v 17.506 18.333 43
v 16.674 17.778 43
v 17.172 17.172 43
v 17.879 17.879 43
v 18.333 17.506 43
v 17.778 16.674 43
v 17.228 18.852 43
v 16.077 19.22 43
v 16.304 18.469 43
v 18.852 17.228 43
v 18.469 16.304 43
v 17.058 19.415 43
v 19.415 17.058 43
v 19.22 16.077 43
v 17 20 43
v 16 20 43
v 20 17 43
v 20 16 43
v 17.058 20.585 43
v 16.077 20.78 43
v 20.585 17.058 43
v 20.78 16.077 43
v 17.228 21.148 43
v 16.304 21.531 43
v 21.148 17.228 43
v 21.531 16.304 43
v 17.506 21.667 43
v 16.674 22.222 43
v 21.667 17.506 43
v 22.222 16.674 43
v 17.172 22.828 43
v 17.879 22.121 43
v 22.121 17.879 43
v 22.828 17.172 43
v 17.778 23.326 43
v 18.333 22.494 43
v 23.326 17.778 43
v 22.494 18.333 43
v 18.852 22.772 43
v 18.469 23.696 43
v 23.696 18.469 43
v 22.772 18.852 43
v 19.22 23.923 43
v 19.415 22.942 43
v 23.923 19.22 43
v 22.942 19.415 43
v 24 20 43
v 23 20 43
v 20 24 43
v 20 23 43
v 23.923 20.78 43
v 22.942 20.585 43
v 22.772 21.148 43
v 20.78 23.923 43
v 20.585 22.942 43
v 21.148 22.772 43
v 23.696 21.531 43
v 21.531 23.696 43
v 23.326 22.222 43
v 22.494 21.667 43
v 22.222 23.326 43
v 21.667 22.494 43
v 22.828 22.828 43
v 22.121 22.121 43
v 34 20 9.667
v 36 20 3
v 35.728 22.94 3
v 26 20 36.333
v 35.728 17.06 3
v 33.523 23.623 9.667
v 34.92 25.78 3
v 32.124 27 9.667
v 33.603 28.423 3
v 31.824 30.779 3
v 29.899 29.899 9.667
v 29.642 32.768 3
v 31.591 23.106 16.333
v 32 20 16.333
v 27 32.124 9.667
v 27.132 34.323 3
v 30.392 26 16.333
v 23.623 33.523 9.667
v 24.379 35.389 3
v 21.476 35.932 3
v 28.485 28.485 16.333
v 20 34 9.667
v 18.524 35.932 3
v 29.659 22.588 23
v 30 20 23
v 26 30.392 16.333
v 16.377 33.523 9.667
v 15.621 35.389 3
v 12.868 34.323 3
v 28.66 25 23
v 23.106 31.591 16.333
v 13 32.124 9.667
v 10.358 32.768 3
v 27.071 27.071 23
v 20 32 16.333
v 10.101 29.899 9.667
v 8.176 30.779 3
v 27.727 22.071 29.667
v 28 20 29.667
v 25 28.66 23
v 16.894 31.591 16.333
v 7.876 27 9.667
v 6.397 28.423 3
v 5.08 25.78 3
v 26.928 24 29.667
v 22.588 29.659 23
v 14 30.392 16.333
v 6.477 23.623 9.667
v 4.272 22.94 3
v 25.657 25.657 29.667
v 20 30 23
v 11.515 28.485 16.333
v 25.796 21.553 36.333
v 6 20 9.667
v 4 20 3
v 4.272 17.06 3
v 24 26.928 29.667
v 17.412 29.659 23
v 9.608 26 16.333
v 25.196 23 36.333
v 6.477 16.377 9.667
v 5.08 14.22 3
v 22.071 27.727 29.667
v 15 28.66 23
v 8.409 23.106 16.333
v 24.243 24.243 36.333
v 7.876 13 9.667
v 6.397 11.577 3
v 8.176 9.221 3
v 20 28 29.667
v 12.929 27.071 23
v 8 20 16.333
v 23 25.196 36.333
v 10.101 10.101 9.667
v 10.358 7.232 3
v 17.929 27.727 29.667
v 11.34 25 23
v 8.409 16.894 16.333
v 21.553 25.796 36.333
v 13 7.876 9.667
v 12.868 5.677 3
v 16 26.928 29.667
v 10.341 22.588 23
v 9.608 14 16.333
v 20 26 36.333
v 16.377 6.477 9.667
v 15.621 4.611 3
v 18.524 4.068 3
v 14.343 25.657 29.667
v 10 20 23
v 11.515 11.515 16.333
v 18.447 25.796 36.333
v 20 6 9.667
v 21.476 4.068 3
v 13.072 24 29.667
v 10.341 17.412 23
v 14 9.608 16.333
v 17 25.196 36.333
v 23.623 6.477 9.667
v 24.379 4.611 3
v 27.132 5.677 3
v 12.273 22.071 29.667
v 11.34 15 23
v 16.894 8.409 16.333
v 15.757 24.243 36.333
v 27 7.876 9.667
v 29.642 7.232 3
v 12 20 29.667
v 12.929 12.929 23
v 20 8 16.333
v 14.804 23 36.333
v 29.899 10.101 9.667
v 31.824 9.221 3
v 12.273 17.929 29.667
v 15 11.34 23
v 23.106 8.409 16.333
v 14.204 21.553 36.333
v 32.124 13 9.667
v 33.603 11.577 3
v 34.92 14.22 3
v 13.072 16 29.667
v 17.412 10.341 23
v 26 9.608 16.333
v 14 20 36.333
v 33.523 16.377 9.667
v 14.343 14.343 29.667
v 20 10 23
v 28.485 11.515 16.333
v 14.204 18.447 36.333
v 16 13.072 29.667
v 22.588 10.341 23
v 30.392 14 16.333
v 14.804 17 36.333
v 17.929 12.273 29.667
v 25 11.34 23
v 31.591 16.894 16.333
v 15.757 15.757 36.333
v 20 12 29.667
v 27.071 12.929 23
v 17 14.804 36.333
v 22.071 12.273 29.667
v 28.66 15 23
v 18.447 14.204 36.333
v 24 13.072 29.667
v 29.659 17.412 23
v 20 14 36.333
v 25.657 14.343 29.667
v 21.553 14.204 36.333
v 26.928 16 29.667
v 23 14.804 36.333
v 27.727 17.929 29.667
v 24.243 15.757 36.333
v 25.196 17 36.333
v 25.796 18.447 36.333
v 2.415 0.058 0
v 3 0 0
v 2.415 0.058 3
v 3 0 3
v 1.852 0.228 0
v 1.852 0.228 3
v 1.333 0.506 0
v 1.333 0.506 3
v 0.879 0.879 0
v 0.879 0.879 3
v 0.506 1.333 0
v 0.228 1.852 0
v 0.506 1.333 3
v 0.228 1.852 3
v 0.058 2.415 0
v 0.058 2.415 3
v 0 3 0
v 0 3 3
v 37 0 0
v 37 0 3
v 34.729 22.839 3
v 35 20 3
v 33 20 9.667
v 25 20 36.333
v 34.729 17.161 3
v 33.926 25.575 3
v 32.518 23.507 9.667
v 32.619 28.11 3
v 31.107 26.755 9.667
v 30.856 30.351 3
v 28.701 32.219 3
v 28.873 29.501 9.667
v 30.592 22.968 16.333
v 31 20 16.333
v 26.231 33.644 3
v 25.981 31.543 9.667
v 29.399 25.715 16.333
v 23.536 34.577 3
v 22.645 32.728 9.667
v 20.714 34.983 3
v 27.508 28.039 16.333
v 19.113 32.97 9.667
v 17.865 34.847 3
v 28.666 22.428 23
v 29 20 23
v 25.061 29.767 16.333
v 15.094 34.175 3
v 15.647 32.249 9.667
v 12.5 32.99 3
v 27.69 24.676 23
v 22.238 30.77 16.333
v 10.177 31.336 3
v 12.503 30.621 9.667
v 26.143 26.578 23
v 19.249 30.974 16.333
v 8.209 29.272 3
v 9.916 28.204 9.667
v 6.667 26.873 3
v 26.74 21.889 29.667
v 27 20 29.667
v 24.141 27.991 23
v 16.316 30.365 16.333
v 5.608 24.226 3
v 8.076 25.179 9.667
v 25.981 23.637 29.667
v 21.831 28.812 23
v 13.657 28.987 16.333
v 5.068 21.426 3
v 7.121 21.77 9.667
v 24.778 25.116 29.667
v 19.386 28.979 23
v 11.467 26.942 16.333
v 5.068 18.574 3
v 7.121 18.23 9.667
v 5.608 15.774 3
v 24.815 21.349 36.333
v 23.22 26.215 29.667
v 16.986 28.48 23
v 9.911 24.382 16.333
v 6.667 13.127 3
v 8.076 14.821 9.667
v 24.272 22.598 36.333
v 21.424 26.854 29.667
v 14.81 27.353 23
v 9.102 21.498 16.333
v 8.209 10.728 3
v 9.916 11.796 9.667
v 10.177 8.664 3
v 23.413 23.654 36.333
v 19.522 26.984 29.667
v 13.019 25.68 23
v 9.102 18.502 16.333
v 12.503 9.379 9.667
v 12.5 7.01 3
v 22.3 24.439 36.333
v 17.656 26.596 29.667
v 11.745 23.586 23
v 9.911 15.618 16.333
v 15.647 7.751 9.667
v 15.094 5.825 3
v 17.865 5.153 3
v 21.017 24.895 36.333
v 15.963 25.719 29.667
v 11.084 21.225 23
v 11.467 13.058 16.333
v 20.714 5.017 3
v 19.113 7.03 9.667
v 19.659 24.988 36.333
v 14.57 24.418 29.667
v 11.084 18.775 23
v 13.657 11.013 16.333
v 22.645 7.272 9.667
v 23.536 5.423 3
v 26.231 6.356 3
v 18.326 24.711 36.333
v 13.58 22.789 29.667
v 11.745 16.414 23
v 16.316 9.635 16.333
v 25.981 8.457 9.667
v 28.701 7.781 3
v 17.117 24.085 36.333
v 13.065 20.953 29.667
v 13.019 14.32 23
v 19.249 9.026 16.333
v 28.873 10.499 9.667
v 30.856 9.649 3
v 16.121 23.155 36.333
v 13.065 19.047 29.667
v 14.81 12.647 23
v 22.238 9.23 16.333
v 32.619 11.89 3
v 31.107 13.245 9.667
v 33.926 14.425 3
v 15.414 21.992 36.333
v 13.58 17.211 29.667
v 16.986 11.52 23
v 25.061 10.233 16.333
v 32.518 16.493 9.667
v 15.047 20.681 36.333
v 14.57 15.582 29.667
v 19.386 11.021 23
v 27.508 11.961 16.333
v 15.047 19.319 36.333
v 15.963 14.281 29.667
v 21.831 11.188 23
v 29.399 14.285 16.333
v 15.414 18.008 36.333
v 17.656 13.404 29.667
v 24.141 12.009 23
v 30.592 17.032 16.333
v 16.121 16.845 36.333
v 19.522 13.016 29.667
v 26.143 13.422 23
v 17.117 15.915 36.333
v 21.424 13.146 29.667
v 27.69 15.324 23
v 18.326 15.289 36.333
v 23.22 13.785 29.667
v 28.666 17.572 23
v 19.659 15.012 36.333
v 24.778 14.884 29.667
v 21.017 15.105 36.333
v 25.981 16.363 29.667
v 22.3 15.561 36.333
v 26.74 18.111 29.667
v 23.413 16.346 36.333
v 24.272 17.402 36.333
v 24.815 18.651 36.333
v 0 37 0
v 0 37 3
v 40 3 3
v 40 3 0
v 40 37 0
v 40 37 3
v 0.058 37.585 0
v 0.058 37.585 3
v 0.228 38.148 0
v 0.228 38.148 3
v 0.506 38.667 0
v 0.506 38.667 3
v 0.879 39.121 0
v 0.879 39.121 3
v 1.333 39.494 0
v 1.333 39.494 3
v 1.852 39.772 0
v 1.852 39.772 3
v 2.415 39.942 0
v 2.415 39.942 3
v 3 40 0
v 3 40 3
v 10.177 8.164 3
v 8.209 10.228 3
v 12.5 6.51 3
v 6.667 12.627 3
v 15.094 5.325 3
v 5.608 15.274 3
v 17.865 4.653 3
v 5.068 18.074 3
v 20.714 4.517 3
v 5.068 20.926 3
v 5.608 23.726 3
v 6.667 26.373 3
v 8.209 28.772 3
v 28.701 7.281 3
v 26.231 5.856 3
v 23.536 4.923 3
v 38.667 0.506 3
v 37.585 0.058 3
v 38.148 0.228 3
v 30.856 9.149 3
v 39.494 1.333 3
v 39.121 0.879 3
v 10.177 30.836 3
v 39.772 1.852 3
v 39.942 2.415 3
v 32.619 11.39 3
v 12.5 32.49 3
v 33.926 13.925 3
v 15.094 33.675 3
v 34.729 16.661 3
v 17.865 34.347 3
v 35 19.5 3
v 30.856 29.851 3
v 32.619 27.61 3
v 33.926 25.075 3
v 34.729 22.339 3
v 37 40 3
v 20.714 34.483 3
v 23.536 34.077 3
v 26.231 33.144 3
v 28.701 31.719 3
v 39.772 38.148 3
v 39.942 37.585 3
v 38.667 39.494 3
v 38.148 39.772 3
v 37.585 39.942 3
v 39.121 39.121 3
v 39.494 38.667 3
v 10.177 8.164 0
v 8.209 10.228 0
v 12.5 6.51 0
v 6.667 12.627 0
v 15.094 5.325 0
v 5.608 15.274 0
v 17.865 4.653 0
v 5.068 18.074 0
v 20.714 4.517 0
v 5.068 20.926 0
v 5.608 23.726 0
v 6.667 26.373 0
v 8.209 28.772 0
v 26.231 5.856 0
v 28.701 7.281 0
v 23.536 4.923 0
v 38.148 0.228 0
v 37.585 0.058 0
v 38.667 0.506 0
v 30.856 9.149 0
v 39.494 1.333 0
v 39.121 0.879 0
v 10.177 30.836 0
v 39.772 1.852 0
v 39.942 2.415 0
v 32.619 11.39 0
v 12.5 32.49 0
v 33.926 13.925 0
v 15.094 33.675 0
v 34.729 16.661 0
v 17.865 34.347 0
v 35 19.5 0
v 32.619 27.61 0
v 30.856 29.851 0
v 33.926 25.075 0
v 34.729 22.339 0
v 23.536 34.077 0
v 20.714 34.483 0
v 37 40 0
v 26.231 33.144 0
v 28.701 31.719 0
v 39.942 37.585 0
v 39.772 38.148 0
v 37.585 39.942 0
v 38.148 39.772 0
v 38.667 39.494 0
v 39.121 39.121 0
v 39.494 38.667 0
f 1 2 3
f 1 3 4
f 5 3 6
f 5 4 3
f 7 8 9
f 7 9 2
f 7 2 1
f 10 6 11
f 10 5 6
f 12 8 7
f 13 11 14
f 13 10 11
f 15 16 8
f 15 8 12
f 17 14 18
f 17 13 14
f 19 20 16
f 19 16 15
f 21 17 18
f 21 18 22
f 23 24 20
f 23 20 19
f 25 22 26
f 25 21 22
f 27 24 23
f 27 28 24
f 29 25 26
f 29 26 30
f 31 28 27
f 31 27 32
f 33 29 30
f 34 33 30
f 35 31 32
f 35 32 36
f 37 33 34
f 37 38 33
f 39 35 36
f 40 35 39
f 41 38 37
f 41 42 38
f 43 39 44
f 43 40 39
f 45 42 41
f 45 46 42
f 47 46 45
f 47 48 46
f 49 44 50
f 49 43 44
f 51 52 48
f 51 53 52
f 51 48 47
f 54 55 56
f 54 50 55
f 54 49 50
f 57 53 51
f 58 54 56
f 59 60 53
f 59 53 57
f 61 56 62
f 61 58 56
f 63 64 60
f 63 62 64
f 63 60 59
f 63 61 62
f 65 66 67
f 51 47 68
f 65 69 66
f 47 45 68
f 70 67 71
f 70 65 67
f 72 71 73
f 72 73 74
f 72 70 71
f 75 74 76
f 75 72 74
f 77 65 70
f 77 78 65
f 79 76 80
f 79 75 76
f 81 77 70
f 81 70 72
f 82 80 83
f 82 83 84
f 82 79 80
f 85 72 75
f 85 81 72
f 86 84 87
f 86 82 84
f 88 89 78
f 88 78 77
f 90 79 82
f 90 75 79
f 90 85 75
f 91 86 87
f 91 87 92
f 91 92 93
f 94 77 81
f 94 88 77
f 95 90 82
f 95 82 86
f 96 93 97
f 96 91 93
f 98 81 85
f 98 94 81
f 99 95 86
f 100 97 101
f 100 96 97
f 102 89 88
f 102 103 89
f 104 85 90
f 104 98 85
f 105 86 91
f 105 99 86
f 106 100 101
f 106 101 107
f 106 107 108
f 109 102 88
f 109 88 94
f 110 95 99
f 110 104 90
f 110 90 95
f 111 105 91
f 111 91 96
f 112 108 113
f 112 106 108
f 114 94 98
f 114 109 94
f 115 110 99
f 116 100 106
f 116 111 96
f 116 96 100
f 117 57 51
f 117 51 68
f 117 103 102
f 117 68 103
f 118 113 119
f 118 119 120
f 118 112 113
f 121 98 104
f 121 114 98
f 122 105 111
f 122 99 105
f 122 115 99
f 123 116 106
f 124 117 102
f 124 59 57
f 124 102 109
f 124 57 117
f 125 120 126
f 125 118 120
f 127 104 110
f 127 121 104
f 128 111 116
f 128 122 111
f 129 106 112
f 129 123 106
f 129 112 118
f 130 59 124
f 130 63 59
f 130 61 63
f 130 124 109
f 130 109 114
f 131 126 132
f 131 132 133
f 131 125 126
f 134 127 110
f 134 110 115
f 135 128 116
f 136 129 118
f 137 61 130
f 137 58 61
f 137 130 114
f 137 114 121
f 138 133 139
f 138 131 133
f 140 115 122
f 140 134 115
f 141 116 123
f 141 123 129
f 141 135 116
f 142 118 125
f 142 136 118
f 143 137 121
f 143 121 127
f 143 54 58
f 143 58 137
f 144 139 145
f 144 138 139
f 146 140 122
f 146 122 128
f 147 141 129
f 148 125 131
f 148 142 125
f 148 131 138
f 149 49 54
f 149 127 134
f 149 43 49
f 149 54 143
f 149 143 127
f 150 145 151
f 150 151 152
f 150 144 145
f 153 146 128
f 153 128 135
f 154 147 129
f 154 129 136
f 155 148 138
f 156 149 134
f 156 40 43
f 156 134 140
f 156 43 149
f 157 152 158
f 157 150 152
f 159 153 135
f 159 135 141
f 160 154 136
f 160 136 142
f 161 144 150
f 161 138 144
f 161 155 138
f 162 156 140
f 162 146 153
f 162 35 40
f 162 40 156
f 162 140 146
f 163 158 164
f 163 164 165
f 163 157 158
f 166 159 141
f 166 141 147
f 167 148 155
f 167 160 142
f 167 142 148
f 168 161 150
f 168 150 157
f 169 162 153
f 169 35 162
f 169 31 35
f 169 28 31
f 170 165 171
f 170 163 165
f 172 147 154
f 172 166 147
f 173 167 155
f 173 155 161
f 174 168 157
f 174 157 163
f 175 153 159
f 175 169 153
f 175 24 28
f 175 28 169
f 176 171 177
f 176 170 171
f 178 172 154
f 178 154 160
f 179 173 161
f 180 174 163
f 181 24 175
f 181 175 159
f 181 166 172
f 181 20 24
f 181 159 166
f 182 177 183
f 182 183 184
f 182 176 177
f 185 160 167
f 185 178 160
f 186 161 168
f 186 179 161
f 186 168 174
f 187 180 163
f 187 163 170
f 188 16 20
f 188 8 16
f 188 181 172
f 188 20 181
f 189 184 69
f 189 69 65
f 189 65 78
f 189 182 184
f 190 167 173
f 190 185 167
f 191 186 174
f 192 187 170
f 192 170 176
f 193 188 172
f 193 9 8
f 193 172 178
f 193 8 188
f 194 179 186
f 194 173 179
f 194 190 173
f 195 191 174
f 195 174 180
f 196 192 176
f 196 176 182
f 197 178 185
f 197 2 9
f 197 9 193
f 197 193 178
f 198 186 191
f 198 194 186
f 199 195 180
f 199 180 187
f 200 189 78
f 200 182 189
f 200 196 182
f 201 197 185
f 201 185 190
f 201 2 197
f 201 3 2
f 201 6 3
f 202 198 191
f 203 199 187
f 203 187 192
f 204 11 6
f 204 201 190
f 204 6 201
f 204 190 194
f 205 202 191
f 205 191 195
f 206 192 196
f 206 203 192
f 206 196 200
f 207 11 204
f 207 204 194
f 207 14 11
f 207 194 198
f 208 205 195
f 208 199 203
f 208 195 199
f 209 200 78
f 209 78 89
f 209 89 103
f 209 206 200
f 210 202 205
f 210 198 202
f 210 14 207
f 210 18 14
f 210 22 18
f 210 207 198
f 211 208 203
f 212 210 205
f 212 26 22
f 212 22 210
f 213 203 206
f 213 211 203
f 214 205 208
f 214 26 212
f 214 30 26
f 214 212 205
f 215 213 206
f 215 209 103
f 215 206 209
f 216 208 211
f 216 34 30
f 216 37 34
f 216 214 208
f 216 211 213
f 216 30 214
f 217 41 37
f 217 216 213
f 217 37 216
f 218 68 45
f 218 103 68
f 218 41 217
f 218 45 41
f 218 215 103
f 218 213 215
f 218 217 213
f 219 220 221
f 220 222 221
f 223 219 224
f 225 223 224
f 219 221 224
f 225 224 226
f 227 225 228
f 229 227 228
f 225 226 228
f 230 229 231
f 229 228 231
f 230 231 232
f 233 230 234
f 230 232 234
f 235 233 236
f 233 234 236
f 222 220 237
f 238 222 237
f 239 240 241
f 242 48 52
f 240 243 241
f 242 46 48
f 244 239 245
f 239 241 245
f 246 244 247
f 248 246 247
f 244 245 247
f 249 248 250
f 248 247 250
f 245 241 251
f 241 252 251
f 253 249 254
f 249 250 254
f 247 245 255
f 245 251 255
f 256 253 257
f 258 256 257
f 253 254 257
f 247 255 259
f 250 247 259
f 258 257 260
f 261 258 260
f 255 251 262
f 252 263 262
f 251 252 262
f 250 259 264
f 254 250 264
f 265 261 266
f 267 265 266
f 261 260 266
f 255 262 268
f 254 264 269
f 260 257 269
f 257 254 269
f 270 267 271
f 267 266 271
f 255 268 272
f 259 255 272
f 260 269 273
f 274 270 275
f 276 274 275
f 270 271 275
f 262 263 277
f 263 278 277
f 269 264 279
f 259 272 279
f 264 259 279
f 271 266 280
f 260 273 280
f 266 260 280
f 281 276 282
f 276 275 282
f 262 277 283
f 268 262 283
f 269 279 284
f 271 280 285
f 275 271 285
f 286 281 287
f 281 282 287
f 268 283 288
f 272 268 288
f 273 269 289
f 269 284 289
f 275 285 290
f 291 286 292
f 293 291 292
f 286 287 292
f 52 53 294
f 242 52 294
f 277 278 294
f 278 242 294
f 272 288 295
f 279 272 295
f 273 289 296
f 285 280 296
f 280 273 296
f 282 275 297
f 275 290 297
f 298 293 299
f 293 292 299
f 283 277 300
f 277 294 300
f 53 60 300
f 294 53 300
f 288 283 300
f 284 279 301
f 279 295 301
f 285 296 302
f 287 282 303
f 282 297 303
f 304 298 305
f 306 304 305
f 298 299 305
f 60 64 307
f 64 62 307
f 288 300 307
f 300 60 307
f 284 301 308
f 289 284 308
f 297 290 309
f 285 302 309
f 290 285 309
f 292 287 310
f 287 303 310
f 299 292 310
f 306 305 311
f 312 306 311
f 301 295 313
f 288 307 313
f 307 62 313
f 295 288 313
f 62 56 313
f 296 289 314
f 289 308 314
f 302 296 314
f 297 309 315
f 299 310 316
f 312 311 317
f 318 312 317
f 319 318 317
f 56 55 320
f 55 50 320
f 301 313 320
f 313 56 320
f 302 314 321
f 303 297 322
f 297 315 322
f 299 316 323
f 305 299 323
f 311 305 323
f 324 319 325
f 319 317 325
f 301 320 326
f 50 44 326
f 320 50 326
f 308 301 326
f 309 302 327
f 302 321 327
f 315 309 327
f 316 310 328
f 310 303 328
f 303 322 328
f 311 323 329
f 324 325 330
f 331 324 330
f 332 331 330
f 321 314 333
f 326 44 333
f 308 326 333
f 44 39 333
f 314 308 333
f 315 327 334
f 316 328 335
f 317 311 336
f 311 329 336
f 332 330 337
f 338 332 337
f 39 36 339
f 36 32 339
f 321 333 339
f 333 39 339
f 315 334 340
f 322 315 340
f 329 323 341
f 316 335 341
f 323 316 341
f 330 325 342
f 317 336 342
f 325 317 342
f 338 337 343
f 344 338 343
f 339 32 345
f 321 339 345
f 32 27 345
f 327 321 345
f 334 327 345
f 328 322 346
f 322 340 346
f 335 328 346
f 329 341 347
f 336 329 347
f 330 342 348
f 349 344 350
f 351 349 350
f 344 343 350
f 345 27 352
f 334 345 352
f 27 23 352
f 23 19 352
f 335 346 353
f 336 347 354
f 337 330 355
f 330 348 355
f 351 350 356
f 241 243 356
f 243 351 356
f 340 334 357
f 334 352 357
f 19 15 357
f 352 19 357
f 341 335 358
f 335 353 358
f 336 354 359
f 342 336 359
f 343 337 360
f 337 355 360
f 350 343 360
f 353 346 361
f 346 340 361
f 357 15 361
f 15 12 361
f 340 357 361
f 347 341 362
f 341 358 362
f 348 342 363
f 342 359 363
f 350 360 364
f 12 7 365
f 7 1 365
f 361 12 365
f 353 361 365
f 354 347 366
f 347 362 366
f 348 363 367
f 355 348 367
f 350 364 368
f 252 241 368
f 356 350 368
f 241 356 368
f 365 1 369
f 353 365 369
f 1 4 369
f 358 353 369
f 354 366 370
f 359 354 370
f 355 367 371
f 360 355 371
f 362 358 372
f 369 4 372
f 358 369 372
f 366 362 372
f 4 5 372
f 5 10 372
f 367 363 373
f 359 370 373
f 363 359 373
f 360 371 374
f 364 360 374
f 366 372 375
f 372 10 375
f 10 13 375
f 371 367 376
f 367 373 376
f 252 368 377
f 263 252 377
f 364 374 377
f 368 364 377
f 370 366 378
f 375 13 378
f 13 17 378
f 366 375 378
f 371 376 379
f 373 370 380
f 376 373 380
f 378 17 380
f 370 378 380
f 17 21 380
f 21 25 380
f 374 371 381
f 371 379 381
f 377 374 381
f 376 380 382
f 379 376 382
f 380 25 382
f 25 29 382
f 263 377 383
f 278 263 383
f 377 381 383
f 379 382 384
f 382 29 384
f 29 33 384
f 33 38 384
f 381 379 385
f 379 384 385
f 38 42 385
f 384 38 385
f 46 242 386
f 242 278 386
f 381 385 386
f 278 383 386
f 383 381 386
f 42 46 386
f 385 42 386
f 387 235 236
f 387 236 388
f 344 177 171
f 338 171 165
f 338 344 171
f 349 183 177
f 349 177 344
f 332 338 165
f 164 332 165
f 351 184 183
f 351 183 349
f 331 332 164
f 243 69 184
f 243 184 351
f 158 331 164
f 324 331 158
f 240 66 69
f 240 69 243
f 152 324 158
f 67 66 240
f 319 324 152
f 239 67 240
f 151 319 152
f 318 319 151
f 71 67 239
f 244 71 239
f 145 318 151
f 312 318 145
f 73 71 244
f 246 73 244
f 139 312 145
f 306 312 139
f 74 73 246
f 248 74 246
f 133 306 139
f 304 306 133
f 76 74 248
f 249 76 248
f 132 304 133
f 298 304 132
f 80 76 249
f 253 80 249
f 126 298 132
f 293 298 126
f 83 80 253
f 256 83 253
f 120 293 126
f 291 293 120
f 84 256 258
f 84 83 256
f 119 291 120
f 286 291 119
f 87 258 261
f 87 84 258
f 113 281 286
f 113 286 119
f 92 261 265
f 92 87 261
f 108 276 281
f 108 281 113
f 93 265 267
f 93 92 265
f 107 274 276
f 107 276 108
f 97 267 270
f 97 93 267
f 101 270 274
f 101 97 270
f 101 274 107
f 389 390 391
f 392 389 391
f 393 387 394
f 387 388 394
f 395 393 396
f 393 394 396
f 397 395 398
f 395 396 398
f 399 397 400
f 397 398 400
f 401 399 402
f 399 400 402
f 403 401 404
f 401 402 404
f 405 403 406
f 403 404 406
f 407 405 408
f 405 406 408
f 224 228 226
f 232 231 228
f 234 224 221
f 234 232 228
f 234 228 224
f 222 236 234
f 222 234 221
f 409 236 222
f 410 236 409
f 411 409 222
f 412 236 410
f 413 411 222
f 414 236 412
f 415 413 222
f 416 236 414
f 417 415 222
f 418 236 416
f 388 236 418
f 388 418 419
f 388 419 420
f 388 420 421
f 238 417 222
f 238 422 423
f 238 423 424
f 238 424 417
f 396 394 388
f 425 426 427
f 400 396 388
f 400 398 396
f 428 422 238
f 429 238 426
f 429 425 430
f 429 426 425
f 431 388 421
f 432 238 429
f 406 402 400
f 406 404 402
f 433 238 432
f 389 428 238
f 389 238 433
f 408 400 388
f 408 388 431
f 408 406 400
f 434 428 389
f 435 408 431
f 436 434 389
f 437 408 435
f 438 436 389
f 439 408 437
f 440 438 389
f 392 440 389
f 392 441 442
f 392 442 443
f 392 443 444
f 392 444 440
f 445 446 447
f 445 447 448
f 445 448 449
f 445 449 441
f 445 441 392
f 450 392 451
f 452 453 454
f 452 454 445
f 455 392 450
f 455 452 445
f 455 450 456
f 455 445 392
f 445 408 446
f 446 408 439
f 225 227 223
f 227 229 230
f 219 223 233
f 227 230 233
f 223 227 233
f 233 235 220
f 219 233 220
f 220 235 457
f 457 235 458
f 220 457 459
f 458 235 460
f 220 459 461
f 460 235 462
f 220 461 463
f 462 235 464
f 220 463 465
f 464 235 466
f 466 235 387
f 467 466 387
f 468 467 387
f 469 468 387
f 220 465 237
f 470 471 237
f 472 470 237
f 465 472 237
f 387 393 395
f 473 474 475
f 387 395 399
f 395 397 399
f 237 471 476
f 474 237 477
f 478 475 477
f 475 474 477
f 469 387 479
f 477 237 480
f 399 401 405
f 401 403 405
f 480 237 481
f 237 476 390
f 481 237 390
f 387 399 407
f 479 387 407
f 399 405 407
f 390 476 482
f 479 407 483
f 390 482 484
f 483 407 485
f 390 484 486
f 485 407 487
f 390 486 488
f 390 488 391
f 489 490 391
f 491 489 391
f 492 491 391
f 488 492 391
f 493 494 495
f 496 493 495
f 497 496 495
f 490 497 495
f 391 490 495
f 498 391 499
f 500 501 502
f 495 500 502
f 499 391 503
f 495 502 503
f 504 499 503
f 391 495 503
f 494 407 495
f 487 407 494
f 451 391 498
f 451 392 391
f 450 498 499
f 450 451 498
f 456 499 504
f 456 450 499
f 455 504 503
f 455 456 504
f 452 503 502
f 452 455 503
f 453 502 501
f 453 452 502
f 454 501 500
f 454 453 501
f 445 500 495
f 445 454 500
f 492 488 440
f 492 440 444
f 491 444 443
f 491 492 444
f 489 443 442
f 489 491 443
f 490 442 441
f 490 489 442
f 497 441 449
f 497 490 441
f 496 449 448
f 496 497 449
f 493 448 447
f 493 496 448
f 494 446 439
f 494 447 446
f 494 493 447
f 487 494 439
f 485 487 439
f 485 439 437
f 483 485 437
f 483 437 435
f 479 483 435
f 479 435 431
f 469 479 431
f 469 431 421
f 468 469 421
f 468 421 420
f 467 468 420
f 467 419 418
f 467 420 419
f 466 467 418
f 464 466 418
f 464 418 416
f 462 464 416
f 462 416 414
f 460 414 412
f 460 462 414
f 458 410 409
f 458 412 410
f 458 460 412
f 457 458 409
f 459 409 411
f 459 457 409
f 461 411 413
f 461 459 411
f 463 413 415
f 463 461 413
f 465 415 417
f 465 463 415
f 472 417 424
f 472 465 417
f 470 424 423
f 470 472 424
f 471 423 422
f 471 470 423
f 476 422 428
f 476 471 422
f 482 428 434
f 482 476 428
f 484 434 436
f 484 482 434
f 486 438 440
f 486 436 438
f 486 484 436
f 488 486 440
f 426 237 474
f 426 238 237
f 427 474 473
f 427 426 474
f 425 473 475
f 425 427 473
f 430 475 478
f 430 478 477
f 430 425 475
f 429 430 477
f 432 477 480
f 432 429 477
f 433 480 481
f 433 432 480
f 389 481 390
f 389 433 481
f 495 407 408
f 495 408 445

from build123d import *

# Parameters (mm, degrees)
CYLINDER_R     = 15
CYLINDER_DEPTH = 6
BOX_W          = 40
BOX_H          = 40
BOX_DEPTH      = 3
FILLET_R       = 3
FILLET001_R    = 3
FILLET002_R    = 3
FILLET003_R    = 3


with BuildPart() as con_interior:
    # Cone001 → Cone001 (revolve)
    with BuildSketch(Plane(origin=(20, 20, 3), x_dir=(1, 0, 0), z_dir=(0, -1, 0))):
        Polygon((0, 0), (15, 0), (3, 40), (0, 40), align=None)
    revolve(axis=Axis((20, 20, 3), (0, 0, 1)))


with BuildPart() as cut:
    # Cone → Cone (revolve)
    with BuildSketch(Plane(origin=(20, 20, 3), x_dir=(1, 0, 0), z_dir=(0, -1, 0))):
        Polygon((0, 0), (16, 0), (4, 40), (0, 40), align=None)
    revolve(axis=Axis((20, 20, 3), (0, 0, 1)))

    # Cut: cut Con-interior
    add(con_interior.part, mode=Mode.SUBTRACT)


with BuildPart() as cilindre:
    # Cylinder → Cylinder (new body)
    with BuildSketch(Plane(origin=(20, 19.5, -2), x_dir=(1, 0, 0), z_dir=(0, 0, 1))):
        Circle(CYLINDER_R)
    extrude(amount=CYLINDER_DEPTH)


with BuildPart() as cut001:
    # Box → Box (new body)
    with BuildSketch(Plane.XY):
        with Locations((20, 20)):
            Rectangle(BOX_W, BOX_H)
    extrude(amount=BOX_DEPTH)

    # Fillet
    fillet_edges = [cut001.edges().sort_by_distance(p)[0] for p in [
        (40, 0, 1.5),
    ]]
    fillet(fillet_edges, radius=FILLET_R)

    # Fillet001
    fillet001_edges = [cut001.edges().sort_by_distance(p)[0] for p in [
        (40, 40, 1.5),
    ]]
    fillet(fillet001_edges, radius=FILLET001_R)

    # Fillet002
    fillet002_edges = [cut001.edges().sort_by_distance(p)[0] for p in [
        (0, 0, 1.5),
    ]]
    fillet(fillet002_edges, radius=FILLET002_R)

    # Fillet003
    fillet003_edges = [cut001.edges().sort_by_distance(p)[0] for p in [
        (0, 40, 1.5),
    ]]
    fillet(fillet003_edges, radius=FILLET003_R)

    # Cut001: cut Cilindre
    add(cilindre.part, mode=Mode.SUBTRACT)


solid = Compound([cut.part, cut001.part])
